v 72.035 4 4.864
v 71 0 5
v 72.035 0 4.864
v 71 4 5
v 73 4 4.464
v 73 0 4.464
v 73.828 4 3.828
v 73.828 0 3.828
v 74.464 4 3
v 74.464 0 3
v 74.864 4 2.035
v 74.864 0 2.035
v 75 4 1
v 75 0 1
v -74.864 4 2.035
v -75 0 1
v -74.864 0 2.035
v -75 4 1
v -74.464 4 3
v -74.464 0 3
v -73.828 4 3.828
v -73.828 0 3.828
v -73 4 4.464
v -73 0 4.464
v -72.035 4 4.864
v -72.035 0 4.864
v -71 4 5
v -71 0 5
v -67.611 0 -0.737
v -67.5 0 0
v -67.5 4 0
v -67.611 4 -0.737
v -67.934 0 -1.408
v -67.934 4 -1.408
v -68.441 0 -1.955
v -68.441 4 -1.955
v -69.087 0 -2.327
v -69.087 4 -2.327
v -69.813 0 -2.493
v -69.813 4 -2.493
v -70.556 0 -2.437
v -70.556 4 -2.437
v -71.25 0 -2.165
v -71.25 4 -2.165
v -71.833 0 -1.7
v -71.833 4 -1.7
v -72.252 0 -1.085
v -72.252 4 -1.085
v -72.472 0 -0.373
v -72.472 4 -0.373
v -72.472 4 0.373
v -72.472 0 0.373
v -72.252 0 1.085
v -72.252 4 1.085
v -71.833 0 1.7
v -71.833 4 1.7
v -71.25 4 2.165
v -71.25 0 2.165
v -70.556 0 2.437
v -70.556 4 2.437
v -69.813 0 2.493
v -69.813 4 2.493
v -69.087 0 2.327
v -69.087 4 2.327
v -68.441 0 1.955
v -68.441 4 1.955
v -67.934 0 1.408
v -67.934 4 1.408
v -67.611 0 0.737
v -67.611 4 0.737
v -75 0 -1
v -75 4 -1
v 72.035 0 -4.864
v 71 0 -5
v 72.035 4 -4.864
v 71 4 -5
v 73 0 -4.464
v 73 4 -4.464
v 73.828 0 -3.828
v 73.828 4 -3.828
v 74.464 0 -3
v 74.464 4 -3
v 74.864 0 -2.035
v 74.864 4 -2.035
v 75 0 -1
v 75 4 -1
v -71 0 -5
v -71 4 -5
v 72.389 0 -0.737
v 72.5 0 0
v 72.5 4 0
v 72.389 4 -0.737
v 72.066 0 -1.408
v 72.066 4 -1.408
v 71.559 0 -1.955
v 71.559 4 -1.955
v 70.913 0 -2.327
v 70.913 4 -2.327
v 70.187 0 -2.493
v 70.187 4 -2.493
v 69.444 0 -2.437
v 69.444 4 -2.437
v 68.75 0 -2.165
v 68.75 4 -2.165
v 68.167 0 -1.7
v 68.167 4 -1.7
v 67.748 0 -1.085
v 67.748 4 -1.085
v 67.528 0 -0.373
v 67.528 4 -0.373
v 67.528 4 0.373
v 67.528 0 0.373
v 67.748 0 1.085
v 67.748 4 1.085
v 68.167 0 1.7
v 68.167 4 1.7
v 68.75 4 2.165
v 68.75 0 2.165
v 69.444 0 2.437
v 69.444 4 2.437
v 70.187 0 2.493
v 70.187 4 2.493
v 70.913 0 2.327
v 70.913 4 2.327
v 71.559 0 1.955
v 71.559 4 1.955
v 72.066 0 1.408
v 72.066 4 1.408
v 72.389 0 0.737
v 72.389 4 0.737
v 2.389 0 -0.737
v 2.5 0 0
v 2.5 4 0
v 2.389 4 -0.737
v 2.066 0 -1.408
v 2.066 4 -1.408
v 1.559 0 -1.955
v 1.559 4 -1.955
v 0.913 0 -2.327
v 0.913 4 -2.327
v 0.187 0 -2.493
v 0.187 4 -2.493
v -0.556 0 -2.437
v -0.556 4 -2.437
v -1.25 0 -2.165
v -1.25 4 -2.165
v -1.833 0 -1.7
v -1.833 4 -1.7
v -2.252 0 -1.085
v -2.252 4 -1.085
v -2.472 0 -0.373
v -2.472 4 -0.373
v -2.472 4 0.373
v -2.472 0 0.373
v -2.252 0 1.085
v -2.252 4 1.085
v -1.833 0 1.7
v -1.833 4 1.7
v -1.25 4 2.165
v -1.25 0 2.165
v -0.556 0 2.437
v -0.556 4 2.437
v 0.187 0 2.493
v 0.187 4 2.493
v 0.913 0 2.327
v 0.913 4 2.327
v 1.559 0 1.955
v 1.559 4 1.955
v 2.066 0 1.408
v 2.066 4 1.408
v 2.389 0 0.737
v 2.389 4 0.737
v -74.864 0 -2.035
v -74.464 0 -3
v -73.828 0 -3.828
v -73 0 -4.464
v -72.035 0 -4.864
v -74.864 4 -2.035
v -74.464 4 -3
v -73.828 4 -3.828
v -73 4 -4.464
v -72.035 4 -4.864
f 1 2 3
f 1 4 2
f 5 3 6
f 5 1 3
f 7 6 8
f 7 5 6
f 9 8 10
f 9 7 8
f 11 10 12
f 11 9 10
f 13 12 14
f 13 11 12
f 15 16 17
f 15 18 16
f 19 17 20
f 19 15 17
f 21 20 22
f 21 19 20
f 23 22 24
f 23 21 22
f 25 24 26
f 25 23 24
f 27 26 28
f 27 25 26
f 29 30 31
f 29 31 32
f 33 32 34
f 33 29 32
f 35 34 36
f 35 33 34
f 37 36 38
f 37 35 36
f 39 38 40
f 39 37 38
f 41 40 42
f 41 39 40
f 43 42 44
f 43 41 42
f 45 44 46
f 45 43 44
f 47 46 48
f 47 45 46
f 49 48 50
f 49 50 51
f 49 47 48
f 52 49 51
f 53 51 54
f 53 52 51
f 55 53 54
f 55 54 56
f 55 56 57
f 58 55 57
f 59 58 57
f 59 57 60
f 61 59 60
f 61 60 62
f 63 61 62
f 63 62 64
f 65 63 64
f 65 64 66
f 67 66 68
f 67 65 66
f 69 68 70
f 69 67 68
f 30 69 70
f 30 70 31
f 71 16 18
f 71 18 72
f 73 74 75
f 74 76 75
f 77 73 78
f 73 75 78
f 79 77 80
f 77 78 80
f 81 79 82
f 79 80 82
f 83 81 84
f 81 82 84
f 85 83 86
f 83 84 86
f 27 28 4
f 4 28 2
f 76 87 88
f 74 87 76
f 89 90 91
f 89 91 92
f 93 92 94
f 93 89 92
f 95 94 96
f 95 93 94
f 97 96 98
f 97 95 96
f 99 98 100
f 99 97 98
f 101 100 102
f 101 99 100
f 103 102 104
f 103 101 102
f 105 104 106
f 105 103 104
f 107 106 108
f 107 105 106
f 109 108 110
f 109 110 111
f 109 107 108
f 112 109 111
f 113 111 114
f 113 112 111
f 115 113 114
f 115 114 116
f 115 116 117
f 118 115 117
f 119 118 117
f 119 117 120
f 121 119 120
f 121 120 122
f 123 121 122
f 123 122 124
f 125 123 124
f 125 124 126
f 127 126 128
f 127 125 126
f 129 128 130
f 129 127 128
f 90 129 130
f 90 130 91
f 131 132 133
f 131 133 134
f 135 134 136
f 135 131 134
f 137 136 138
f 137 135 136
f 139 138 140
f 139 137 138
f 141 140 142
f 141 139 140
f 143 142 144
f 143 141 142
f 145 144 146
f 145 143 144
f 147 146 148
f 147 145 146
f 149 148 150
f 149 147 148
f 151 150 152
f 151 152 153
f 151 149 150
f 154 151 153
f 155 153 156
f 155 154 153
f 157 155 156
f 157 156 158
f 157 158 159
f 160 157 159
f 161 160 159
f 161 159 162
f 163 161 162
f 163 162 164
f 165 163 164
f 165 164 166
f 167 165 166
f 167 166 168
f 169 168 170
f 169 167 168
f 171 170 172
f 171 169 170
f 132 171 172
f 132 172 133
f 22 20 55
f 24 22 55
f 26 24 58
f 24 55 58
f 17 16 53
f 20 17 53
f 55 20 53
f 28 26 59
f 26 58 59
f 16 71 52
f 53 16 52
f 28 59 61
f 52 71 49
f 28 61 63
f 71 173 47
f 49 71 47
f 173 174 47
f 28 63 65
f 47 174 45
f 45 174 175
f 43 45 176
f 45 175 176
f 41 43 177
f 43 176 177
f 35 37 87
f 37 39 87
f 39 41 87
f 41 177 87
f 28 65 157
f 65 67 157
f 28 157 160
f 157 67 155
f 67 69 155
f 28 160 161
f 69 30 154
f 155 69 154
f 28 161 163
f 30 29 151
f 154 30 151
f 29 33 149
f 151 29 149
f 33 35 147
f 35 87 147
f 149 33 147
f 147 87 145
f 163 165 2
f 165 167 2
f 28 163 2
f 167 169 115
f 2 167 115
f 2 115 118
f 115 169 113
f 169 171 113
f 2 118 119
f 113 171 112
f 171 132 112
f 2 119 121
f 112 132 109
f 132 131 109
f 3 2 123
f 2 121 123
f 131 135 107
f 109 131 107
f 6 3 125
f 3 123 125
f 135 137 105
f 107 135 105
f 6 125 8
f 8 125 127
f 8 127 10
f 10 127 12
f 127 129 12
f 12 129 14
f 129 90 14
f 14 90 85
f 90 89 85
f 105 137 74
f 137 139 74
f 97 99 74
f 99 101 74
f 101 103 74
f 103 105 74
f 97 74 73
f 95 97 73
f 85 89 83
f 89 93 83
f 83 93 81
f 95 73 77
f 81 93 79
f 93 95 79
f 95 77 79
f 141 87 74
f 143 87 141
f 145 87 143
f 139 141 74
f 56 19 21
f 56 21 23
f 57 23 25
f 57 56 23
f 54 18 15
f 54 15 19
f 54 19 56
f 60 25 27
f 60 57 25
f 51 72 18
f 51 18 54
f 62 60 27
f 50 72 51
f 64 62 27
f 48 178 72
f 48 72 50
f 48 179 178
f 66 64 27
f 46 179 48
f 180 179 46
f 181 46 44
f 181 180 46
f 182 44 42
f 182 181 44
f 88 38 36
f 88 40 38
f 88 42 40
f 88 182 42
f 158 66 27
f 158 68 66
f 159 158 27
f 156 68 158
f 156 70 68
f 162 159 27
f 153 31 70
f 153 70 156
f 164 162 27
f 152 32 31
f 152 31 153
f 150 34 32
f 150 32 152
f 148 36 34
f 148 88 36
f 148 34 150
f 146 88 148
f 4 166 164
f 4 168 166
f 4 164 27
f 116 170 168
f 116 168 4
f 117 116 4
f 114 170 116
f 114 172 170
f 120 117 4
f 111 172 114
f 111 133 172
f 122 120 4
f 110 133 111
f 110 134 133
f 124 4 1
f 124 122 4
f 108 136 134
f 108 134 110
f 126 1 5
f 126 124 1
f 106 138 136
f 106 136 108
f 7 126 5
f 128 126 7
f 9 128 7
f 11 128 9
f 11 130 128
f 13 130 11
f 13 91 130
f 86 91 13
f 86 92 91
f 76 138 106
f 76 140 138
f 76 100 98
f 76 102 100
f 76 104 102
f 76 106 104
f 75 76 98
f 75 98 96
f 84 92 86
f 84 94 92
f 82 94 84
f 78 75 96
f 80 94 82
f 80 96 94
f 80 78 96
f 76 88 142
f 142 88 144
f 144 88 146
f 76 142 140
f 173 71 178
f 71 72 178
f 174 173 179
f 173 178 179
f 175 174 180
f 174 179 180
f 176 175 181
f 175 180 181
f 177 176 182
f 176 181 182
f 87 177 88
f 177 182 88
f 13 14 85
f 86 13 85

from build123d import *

# Parameters (mm, degrees)
CROQUIS1_W              = 150
CROQUIS1_H              = 10
CROQUIS1_R              = 2.5
SALIENTE_EXTRUIR1_DEPTH = 4
REDONDEO1_R             = 4


with BuildPart() as part:
    # Croquis1 → Saliente-Extruir1 (new body)
    with BuildSketch(Plane(origin=(0, 0, 0), x_dir=(1, 0, 0), z_dir=(0, 1, 0))):
        Rectangle(CROQUIS1_W, CROQUIS1_H)
        with Locations((-70, 0)):
            Circle(CROQUIS1_R, mode=Mode.SUBTRACT)
        with Locations((70, 0)):
            Circle(CROQUIS1_R, mode=Mode.SUBTRACT)
        Circle(CROQUIS1_R, mode=Mode.SUBTRACT)
    extrude(amount=SALIENTE_EXTRUIR1_DEPTH)

    # Redondeo1
    redondeo1_edges = [part.edges().sort_by_distance(p)[0] for p in [
        (75, 2, 5),
        (-75, 2, 5),
        (-75, 2, -5),
        (75, 2, -5),
    ]]
    fillet(redondeo1_edges, radius=REDONDEO1_R)


solid = part.part
